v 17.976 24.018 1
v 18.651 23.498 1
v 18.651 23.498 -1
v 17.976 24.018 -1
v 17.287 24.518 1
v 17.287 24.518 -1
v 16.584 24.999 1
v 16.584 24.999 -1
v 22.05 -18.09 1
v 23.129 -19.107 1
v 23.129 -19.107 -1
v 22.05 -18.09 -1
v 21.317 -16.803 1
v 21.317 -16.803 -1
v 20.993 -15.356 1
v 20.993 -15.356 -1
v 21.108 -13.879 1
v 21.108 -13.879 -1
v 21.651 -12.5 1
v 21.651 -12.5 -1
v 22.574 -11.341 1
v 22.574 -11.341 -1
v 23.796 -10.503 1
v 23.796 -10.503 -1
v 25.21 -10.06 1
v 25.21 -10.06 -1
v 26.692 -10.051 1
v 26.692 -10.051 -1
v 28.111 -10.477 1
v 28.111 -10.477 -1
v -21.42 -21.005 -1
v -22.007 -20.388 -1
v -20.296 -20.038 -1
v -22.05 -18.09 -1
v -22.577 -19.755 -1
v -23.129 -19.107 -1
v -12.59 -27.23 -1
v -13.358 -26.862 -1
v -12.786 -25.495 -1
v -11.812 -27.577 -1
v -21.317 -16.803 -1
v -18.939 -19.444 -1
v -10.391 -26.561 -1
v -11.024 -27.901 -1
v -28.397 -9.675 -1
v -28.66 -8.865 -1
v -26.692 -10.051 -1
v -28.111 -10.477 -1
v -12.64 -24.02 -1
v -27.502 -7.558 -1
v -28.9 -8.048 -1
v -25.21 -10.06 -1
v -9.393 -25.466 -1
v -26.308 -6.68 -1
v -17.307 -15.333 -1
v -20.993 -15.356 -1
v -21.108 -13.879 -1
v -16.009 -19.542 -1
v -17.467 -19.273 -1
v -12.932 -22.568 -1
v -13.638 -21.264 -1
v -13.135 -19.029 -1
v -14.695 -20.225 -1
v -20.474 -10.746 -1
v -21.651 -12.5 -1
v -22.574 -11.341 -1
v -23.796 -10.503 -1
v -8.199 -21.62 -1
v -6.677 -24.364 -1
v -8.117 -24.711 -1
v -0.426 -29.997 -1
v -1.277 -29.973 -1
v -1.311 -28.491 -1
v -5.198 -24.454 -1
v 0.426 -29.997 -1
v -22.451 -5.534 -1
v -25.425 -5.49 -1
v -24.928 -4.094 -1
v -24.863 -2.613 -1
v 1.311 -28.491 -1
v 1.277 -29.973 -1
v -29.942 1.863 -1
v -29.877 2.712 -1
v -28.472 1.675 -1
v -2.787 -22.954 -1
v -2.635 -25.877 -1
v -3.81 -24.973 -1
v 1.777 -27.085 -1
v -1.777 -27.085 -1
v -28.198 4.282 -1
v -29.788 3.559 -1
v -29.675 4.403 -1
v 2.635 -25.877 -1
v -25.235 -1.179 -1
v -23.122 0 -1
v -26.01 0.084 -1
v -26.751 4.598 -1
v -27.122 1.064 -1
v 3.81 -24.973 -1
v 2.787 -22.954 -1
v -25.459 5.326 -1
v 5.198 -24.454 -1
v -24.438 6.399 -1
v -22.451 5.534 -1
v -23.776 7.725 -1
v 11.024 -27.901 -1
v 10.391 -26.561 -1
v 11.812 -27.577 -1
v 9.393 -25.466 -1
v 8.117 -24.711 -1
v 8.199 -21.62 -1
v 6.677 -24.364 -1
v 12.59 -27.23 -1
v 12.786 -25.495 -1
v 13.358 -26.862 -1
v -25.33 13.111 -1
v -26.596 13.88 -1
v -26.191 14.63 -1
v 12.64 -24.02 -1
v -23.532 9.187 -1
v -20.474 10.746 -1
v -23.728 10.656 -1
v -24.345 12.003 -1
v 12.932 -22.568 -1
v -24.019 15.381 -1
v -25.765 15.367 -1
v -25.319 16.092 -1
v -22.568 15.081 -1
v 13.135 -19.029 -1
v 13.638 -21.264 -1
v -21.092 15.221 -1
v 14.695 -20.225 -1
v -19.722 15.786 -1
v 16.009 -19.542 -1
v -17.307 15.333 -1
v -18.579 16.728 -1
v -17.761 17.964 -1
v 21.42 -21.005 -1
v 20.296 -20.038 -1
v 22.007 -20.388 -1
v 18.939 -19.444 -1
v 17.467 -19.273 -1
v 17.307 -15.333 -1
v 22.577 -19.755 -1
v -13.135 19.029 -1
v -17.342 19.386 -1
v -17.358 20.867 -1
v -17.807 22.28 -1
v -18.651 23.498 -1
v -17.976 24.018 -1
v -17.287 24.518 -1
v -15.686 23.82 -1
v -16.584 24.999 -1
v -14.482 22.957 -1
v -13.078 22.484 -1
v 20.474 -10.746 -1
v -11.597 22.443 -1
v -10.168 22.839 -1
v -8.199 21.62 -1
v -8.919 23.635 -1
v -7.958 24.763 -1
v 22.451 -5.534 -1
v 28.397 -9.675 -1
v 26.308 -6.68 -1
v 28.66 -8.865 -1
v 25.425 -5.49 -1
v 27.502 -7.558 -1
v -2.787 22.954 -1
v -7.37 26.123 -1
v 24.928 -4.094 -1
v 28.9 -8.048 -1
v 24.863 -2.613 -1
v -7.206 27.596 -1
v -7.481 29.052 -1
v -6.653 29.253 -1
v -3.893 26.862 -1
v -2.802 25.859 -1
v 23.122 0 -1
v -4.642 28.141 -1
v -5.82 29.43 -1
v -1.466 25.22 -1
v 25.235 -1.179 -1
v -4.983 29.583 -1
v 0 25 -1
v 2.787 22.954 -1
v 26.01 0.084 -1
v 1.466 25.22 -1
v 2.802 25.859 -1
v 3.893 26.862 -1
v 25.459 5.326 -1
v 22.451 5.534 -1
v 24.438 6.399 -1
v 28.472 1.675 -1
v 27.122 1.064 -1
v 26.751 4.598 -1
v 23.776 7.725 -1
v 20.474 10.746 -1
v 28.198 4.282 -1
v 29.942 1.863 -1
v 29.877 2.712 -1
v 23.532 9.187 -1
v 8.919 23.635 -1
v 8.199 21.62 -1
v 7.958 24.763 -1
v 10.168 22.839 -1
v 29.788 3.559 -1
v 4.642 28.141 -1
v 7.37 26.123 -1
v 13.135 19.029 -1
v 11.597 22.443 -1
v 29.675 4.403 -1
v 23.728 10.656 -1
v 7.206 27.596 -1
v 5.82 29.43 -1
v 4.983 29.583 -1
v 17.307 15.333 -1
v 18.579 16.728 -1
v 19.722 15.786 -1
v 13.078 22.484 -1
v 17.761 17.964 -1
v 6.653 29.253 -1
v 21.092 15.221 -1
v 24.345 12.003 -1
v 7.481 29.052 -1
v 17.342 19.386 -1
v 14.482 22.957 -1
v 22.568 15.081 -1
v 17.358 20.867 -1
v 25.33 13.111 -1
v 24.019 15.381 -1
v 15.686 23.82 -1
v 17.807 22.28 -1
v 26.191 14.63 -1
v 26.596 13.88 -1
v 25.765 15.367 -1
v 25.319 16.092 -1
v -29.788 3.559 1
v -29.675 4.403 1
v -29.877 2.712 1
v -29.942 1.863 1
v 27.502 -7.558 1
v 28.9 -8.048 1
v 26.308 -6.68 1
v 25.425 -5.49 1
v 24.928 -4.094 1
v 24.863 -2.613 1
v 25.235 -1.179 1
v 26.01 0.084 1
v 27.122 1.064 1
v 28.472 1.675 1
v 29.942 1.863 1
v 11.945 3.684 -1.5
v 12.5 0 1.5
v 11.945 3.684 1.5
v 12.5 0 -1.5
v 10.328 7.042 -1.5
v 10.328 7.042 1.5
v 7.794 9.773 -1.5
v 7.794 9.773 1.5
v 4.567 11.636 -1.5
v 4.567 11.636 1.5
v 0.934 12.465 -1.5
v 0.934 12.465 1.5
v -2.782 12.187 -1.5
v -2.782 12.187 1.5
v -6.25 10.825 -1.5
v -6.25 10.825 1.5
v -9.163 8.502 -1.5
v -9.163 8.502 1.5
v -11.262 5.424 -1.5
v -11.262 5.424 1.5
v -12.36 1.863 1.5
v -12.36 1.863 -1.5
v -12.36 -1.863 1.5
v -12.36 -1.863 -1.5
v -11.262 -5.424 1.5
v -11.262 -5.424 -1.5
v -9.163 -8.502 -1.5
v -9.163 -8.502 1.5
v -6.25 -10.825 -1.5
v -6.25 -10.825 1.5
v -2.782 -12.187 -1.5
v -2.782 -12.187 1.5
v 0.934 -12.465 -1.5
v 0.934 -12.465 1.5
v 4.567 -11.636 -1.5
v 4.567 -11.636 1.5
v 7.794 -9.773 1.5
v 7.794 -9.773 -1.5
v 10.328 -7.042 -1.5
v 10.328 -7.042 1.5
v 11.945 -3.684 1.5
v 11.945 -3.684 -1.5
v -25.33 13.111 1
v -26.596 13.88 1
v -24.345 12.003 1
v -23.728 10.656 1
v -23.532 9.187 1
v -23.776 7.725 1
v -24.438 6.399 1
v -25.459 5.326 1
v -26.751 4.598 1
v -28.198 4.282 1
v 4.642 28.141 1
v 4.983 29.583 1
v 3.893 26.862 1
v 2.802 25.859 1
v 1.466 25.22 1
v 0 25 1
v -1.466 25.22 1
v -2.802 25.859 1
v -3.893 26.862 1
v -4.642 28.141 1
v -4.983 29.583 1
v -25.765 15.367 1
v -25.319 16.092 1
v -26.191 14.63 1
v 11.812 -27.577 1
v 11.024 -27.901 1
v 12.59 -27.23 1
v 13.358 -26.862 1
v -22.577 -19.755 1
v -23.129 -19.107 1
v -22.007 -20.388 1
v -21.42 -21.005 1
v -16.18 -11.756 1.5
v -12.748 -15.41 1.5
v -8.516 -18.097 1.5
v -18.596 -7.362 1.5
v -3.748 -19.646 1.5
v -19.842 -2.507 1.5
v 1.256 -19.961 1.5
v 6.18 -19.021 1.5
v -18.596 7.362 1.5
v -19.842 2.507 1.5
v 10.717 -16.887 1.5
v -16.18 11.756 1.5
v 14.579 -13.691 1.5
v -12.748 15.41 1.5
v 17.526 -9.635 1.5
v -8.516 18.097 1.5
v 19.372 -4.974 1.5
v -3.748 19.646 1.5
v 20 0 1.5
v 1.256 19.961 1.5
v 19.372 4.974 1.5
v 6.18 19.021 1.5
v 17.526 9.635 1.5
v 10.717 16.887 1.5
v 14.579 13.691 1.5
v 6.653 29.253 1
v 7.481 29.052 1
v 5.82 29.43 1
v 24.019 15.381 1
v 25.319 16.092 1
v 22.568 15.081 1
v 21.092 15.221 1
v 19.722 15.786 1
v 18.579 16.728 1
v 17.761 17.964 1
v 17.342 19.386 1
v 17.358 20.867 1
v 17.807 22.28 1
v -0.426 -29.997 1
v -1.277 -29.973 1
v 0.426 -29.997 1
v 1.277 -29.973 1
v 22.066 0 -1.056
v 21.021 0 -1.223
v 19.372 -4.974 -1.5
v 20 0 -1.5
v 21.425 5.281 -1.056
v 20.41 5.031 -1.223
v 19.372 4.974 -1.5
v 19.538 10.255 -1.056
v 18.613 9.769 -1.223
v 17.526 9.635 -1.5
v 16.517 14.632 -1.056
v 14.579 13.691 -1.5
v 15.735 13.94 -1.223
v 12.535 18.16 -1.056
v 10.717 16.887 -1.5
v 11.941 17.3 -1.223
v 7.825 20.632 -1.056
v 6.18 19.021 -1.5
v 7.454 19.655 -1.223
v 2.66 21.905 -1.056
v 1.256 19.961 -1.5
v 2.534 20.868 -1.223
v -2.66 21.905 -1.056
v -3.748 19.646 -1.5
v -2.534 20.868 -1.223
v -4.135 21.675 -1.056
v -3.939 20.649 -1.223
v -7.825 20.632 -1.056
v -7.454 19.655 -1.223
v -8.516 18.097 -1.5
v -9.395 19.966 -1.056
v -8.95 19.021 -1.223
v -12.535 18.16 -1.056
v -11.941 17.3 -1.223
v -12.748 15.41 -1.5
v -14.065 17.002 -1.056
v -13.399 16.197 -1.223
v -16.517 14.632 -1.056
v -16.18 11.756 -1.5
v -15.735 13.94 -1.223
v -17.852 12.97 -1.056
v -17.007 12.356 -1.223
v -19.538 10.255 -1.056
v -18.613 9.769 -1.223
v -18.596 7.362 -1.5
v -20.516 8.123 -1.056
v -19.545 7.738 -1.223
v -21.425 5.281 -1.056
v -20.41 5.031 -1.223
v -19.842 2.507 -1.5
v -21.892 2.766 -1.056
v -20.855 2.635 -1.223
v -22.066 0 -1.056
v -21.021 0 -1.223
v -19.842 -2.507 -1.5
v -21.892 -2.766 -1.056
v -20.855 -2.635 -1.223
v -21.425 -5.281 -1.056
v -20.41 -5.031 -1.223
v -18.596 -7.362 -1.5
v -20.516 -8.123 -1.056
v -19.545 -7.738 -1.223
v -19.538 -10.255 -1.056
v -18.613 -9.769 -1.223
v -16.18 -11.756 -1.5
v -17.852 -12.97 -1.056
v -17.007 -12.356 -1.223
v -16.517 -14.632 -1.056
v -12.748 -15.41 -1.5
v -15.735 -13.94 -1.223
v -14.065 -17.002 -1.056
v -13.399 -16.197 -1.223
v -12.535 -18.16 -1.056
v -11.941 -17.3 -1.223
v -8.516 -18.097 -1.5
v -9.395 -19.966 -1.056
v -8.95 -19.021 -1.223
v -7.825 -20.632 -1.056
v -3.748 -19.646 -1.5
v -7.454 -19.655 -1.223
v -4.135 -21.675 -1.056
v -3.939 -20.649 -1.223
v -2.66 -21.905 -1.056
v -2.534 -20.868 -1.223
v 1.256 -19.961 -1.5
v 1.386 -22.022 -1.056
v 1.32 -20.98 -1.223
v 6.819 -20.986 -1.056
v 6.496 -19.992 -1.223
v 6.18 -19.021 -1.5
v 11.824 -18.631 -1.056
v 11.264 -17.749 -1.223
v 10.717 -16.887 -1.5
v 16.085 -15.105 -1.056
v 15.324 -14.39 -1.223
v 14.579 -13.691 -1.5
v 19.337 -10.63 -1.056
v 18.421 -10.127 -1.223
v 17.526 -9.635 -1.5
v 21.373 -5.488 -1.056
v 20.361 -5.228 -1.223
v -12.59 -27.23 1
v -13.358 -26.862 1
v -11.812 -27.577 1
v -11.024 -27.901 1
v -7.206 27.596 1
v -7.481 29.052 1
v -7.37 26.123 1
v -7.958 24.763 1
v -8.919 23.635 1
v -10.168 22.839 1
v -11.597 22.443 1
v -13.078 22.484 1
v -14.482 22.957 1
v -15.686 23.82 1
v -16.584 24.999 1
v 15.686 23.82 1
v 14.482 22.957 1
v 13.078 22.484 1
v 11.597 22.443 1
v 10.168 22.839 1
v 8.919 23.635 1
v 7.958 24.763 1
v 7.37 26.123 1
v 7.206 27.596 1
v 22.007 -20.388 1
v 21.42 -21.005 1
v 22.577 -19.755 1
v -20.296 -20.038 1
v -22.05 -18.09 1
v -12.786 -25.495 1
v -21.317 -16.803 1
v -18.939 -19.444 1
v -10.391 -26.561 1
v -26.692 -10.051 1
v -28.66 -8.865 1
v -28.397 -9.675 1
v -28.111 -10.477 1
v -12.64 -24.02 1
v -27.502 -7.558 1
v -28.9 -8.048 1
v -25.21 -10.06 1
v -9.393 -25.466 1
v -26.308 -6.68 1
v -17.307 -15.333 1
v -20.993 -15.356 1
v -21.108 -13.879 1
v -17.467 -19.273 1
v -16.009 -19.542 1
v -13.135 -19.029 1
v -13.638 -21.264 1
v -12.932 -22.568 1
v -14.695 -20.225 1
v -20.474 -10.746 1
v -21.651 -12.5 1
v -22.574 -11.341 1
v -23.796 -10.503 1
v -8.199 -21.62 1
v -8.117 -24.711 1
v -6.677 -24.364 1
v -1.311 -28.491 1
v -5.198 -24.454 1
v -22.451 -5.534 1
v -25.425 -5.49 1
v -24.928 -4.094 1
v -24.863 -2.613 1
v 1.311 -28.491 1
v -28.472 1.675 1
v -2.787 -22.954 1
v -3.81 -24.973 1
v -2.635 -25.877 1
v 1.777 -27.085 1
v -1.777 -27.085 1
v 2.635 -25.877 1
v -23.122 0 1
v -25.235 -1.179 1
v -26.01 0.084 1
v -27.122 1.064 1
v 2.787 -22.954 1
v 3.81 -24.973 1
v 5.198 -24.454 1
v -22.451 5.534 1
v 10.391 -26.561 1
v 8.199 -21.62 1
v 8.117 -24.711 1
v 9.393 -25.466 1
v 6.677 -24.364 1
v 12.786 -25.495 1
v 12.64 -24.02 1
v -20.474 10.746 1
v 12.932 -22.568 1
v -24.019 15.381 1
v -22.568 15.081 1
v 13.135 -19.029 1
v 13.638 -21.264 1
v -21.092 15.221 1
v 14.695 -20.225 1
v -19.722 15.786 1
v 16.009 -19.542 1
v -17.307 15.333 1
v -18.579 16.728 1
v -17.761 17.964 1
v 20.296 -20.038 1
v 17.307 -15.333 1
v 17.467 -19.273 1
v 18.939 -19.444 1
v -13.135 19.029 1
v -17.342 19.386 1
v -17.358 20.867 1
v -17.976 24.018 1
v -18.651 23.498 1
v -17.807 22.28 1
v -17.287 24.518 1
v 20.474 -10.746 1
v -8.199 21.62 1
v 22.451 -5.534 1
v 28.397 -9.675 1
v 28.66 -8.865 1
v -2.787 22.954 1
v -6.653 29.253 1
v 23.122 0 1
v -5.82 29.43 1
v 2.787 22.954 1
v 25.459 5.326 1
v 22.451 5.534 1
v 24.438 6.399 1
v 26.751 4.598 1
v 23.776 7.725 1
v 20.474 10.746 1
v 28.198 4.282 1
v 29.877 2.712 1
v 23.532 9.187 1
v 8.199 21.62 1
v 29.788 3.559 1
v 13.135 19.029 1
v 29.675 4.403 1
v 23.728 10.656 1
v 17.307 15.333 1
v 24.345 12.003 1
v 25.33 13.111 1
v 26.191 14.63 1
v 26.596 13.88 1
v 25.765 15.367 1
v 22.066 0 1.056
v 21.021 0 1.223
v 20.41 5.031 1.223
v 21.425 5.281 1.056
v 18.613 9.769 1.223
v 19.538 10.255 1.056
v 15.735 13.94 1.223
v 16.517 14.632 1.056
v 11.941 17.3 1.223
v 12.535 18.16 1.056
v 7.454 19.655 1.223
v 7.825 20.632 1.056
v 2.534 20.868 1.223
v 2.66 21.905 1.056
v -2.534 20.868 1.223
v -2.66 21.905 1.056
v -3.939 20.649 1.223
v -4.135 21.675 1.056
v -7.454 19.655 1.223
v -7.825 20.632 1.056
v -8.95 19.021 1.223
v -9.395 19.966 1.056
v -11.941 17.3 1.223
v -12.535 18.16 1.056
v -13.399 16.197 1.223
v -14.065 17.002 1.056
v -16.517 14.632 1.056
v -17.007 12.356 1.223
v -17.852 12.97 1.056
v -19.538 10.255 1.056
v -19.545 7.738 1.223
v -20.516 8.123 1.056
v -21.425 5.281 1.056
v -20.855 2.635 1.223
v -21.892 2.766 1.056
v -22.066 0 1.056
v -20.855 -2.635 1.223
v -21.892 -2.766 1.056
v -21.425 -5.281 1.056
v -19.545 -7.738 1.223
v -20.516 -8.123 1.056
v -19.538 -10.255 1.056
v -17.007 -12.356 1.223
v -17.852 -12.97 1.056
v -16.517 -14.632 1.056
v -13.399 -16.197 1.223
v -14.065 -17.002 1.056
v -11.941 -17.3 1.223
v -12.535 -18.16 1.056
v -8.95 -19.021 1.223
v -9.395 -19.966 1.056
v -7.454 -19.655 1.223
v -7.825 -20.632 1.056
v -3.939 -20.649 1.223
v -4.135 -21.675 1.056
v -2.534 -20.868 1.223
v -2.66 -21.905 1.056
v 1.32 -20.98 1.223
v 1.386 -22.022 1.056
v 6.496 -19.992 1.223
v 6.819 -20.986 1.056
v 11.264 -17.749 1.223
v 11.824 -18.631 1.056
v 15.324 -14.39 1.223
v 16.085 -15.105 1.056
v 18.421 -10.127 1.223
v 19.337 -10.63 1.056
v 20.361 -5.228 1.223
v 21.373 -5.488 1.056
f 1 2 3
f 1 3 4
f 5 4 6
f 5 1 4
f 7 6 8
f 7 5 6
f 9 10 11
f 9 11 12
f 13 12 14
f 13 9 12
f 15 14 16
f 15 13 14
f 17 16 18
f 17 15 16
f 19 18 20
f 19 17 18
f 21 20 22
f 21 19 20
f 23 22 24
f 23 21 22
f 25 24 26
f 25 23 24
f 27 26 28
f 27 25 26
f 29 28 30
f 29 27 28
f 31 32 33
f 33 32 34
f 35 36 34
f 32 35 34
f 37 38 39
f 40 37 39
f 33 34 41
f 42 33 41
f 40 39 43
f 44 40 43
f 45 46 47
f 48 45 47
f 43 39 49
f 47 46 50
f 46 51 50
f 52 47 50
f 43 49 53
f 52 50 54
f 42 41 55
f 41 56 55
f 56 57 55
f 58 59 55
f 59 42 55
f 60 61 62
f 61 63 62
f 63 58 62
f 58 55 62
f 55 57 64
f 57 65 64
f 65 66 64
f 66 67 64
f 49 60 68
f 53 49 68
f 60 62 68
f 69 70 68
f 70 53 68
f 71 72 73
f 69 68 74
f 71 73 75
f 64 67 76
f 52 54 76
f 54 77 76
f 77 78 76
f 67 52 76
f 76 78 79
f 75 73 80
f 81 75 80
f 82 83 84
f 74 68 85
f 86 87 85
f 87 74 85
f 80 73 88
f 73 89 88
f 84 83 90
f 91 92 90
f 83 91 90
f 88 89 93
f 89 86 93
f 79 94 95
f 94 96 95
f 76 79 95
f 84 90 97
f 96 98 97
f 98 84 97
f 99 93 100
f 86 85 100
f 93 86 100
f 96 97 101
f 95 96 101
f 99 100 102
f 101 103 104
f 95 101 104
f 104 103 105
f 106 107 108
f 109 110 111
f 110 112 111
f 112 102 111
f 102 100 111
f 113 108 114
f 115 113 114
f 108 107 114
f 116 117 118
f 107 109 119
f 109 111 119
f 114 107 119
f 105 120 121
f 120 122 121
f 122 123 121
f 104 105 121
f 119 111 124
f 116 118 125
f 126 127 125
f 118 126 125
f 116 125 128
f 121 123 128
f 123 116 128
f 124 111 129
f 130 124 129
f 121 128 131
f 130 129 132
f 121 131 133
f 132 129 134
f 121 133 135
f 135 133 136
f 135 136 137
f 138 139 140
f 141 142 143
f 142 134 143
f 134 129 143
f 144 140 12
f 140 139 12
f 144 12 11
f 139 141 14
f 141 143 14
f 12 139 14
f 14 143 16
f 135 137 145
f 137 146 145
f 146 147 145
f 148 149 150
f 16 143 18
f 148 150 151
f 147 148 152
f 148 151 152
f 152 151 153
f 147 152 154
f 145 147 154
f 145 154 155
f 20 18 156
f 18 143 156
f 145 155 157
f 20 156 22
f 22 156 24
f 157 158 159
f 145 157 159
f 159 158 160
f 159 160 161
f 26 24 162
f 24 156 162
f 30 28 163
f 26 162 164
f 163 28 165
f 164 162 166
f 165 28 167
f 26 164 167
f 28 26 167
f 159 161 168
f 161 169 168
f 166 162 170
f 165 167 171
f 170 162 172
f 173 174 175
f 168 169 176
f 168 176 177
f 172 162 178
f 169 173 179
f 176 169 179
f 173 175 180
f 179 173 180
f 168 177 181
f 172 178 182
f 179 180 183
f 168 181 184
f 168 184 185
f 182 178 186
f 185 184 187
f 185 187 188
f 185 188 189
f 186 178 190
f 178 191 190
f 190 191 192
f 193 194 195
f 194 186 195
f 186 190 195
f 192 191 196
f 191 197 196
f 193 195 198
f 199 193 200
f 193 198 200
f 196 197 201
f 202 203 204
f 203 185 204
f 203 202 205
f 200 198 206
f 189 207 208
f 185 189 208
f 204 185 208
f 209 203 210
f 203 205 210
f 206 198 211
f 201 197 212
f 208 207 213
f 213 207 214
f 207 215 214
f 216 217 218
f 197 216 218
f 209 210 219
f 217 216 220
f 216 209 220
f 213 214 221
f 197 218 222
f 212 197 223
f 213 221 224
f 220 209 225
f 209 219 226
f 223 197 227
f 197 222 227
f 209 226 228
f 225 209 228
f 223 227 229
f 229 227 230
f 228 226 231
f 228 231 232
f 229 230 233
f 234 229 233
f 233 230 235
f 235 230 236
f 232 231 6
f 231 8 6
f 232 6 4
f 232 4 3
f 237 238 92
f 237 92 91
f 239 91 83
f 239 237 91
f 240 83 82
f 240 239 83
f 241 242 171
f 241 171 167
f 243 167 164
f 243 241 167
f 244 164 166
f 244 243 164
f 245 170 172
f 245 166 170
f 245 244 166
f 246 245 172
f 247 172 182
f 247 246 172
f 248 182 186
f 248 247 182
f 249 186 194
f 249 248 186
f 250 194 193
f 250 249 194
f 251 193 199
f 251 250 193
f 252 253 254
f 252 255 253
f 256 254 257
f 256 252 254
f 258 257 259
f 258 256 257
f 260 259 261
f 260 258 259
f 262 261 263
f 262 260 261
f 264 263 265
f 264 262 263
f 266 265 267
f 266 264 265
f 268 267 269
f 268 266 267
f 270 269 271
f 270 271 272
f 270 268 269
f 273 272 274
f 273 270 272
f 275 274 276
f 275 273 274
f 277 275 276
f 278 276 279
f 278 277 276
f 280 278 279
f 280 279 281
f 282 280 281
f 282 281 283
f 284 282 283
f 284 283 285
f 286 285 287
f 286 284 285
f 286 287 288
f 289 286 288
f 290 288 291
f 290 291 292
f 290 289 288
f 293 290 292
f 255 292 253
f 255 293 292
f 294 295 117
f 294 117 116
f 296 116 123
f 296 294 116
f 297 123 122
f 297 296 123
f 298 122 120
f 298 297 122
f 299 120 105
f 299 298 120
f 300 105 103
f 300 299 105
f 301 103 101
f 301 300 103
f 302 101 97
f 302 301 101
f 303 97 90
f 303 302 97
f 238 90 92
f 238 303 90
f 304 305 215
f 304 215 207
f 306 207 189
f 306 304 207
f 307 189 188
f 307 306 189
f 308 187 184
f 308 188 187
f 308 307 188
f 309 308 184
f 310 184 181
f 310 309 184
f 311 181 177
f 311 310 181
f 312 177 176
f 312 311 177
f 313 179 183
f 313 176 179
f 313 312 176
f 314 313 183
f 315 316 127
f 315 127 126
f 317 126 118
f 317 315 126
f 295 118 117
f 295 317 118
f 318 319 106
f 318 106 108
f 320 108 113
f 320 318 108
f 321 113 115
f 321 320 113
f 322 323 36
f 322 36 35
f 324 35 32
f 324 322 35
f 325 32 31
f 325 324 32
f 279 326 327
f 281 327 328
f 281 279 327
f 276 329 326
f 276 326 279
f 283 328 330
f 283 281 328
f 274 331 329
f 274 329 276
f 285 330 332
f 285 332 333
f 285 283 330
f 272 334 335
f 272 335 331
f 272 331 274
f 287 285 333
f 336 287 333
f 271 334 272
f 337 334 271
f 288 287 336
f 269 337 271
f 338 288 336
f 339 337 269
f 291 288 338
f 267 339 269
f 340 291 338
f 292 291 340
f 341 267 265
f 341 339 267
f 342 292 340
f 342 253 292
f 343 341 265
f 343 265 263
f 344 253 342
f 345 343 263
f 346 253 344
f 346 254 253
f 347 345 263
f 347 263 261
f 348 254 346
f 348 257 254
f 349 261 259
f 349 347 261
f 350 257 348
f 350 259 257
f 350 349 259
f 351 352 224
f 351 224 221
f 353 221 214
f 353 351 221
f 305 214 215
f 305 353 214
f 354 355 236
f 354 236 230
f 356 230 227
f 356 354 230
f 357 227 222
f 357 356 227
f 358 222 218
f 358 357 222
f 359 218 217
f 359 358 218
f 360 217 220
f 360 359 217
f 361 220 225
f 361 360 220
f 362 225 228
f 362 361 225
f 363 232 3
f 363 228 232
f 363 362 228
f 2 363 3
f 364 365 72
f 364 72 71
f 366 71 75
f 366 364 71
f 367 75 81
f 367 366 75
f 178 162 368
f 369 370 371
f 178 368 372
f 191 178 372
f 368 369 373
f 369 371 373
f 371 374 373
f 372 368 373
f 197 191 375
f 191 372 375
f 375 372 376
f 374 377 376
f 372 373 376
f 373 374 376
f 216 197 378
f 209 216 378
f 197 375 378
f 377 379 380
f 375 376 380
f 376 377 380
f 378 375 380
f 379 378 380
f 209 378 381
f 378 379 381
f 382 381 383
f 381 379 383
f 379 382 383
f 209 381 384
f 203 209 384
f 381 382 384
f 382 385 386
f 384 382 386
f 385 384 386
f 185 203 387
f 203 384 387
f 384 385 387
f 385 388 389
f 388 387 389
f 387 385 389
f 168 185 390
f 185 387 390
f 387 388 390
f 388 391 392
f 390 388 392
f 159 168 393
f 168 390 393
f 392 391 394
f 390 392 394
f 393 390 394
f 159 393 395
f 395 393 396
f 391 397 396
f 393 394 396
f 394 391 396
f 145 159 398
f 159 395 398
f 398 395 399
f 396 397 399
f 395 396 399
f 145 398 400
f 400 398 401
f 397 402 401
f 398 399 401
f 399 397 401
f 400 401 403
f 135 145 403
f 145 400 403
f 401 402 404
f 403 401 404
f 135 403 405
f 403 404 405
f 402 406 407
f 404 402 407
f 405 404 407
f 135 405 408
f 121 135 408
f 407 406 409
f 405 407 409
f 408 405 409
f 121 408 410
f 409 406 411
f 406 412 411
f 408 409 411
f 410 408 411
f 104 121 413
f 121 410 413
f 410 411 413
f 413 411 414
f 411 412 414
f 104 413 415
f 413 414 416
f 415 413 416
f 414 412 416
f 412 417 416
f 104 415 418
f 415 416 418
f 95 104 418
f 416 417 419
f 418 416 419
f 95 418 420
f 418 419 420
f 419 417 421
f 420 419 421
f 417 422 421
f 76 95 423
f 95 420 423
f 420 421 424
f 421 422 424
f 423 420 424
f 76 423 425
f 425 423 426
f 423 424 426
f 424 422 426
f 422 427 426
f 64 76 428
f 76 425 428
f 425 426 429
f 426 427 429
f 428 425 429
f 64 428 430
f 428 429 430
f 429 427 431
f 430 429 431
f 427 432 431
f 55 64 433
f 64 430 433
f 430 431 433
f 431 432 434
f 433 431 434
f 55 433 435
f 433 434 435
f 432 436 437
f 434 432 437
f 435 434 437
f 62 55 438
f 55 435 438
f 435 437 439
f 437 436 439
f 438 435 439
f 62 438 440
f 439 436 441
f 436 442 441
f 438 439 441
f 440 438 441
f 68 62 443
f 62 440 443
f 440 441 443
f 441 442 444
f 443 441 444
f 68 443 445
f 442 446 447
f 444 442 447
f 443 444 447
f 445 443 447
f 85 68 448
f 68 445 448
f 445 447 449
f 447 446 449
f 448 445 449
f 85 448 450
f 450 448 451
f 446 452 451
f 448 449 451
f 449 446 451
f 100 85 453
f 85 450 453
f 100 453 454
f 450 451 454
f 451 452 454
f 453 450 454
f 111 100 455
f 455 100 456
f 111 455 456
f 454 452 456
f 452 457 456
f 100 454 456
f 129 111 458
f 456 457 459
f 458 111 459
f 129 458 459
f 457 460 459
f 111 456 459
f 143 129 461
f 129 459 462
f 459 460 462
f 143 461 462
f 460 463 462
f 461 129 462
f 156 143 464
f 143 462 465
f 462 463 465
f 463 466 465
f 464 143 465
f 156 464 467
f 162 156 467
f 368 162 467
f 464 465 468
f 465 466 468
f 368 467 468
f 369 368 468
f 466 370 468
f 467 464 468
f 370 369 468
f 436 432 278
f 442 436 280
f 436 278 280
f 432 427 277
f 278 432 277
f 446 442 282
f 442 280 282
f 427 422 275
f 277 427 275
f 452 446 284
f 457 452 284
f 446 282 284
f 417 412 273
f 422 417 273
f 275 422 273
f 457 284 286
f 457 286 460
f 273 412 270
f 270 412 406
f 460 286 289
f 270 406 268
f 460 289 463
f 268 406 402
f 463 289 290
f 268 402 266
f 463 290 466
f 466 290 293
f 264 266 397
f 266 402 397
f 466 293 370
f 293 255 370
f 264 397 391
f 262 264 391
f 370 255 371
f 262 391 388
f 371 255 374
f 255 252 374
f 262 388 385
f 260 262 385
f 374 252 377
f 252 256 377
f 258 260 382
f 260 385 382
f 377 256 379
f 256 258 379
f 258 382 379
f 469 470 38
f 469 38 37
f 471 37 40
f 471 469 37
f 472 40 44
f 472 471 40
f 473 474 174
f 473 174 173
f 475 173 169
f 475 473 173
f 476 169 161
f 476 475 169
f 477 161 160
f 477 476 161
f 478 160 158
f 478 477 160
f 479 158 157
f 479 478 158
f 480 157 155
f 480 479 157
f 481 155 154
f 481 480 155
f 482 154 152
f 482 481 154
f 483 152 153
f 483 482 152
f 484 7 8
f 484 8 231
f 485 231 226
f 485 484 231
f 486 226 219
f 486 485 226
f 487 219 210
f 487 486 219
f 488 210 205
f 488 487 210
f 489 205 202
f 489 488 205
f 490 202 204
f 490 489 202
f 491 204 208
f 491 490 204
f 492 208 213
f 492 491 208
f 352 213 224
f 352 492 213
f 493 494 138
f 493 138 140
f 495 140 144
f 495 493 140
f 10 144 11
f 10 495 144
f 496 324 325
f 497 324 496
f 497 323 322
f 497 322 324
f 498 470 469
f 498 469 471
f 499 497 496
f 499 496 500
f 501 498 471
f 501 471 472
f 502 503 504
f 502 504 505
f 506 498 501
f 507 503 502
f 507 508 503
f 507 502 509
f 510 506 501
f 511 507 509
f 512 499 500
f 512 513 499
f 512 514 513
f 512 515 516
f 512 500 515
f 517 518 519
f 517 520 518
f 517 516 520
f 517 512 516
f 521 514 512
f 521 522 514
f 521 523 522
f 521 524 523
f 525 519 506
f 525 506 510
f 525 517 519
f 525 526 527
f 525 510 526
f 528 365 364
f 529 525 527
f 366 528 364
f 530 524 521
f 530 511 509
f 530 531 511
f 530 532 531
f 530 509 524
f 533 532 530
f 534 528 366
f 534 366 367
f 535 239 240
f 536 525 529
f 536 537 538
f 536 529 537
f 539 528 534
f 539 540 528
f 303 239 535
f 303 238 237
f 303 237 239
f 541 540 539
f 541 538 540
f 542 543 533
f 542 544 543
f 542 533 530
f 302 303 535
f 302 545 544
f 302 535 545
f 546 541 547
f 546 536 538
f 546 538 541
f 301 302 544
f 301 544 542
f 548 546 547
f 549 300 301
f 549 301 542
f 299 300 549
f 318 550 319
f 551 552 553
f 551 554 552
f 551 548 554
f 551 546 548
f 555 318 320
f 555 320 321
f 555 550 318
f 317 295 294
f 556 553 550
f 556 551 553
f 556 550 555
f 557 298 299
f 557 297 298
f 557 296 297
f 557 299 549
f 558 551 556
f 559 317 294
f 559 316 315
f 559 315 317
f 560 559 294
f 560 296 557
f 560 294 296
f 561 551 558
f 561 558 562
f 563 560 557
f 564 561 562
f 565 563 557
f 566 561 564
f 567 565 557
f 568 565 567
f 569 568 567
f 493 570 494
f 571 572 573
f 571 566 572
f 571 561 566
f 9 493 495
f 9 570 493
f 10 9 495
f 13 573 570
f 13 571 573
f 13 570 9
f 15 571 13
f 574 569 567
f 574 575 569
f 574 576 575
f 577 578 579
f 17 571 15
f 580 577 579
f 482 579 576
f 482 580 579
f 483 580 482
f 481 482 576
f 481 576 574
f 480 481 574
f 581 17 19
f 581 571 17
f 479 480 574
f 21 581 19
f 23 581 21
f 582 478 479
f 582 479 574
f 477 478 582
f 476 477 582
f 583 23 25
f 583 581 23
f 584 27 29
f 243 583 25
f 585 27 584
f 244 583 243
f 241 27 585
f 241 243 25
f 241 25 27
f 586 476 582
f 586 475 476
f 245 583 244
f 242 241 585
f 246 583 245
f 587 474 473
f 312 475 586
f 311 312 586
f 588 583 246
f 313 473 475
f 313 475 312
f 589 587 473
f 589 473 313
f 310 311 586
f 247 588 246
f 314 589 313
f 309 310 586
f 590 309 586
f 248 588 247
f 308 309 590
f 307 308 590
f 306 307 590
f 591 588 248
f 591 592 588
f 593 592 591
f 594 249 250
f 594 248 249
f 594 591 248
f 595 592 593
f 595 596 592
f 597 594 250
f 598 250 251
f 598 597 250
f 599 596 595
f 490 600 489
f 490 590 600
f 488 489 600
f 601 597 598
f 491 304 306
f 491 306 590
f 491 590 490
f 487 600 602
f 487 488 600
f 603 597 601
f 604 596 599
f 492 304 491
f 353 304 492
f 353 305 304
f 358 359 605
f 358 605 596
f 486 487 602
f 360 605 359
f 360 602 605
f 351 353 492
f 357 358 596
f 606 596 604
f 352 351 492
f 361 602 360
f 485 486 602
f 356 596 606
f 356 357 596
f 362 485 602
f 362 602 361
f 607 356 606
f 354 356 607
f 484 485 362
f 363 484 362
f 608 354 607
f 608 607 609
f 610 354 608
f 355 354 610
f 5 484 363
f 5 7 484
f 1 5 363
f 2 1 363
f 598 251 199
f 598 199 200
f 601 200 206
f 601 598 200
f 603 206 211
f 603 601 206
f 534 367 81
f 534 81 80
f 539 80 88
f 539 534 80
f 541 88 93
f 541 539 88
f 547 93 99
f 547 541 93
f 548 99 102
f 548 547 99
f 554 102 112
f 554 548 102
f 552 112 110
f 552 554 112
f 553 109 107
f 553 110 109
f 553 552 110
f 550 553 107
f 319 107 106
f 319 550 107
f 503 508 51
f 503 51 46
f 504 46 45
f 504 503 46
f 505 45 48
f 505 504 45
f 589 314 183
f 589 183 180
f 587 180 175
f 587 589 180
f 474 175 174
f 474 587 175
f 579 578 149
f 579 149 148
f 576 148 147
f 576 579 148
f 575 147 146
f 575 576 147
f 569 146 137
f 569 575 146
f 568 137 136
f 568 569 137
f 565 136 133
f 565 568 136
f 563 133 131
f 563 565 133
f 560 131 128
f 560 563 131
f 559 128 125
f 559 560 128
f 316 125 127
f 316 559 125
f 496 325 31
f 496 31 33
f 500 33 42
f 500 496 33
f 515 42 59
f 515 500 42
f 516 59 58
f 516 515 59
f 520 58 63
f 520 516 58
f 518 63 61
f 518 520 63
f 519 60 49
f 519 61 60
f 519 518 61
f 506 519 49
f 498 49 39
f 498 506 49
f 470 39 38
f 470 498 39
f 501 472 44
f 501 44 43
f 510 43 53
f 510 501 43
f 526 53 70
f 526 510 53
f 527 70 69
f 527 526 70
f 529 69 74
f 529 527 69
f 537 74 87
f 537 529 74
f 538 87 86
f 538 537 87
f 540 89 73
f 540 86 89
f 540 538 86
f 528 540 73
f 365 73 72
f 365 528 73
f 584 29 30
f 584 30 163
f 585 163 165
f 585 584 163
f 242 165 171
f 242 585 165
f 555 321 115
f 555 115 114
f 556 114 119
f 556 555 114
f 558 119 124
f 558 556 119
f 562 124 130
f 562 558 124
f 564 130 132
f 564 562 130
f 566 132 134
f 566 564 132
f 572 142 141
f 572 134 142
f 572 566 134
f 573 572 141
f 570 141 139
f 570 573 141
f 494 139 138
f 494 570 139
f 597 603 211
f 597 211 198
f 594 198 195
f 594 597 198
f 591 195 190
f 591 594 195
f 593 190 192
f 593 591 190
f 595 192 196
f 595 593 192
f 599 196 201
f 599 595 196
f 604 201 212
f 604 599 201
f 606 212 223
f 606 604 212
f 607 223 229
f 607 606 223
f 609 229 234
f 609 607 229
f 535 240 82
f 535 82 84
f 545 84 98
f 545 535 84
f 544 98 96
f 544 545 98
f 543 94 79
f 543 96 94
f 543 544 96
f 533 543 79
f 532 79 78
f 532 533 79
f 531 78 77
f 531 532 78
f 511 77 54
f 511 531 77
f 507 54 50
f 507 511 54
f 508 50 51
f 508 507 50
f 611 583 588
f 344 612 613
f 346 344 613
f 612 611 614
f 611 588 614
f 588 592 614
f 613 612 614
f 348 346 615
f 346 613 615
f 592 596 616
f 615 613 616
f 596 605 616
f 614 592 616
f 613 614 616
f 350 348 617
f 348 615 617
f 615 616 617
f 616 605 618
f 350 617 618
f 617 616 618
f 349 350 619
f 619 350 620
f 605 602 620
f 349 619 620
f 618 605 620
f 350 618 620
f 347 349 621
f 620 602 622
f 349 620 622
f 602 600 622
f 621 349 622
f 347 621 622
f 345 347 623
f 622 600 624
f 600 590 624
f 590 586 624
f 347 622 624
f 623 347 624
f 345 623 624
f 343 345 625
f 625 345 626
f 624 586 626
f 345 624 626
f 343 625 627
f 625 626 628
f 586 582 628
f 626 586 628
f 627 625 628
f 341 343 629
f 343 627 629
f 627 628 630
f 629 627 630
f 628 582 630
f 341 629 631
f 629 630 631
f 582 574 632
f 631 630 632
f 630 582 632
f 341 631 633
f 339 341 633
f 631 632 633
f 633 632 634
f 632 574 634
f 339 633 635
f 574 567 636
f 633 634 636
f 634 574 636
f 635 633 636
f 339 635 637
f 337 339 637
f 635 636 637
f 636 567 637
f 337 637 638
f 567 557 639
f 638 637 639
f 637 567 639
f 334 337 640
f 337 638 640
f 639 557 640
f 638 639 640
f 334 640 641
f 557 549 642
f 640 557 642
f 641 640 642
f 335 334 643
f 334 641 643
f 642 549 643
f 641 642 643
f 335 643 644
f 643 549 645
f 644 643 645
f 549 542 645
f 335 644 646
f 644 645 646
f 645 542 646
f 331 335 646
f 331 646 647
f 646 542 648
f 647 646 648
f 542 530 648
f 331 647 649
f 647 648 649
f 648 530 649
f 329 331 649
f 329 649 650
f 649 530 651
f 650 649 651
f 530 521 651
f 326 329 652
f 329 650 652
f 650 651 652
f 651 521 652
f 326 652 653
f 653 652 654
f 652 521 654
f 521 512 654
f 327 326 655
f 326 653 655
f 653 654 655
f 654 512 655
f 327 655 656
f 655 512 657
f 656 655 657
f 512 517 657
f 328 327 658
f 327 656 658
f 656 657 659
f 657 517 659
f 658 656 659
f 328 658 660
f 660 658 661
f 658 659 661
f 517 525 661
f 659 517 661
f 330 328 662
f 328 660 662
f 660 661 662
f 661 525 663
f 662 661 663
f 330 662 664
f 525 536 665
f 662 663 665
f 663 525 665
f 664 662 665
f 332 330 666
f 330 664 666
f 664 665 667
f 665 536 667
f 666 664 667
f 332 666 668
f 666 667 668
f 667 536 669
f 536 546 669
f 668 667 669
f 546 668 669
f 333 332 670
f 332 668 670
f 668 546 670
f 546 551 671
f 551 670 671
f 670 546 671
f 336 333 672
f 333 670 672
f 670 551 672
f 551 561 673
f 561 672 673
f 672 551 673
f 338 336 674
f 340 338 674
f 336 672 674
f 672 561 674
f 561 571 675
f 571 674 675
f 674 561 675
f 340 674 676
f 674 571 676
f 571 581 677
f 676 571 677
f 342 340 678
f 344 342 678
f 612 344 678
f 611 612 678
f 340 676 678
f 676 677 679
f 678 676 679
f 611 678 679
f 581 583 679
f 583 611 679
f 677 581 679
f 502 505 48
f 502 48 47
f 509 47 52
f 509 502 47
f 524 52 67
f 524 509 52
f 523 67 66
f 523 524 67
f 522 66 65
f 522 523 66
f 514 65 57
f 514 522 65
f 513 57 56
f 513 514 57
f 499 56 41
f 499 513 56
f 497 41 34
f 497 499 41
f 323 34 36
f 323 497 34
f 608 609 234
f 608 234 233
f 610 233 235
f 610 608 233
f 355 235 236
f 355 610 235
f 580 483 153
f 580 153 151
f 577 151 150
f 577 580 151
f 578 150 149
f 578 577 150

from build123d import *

# Parameters (mm, degrees)
SKETCH1_R            = 12.5
BOSS_EXTRUDE1_DEPTH  = 1.5
SKETCH2_R            = 40
SKETCH2_R_2          = 20
CUT_EXTRUDE1_DEPTH   = 0.5
FILLET1_R            = 10
FILLET1_OF_MIRROR1_R = 10


with BuildPart() as part:
    # Sketch1 → Boss-Extrude1 (new, symmetric)
    with BuildSketch(Plane.XY):
        with BuildLine():
            ThreePointArc((-4.982608643, 29.583333333), (-6.237350725, 29.344428022), (-7.480786198, 29.052329302))
            ThreePointArc((-7.480786198, 29.052329302), (-10.168416077, 22.838636441), (-16.584465184, 24.999110275))
            ThreePointArc((-16.584465184, 24.999110275), (-17.633557569, 24.270509831), (-18.650685145, 23.497913602))
            ThreePointArc((-18.650685145, 23.497913602), (-18.578620637, 16.728265159), (-25.31871703, 16.092313941))
            ThreePointArc((-25.31871703, 16.092313941), (-25.980762114, 15), (-26.595711193, 13.880495168))
            ThreePointArc((-26.595711193, 13.880495168), (-23.776412907, 7.725424859), (-29.675132687, 4.403010332))
            ThreePointArc((-29.675132687, 4.403010332), (-29.835656861, 3.135853898), (-29.942097162, 1.86301302))
            ThreePointArc((-29.942097162, 1.86301302), (-24.863047384, -2.613211582), (-28.900448313, -8.047613763))
            ThreePointArc((-28.900448313, -8.047613763), (-28.531695489, -9.270509831), (-28.111222517, -10.476601005))
            ThreePointArc((-28.111222517, -10.476601005), (-21.650635095, -12.5), (-23.128613874, -19.106732329))
            ThreePointArc((-23.128613874, -19.106732329), (-22.294344764, -20.073918191), (-21.419662115, -21.004715539))
            ThreePointArc((-21.419662115, -21.004715539), (-14.694631307, -20.225424859), (-13.357631979, -26.862123295))
            ThreePointArc((-13.357631979, -26.862123295), (-12.202099292, -27.406363729), (-11.024447543, -27.900923934))
            ThreePointArc((-11.024447543, -27.900923934), (-5.19779227, -24.453690018), (-1.276994164, -29.972809109))
            ThreePointArc((-1.276994164, -29.972809109), (0, -30), (1.276994164, -29.972809109))
            ThreePointArc((1.276994164, -29.972809109), (5.19779227, -24.453690018), (11.024447543, -27.900923934))
            ThreePointArc((11.024447543, -27.900923934), (12.202099292, -27.406363729), (13.357631979, -26.862123295))
            ThreePointArc((13.357631979, -26.862123295), (14.694631307, -20.225424859), (21.419662115, -21.004715539))
            ThreePointArc((21.419662115, -21.004715539), (22.294344764, -20.073918191), (23.128613874, -19.106732329))
            ThreePointArc((23.128613874, -19.106732329), (21.650635095, -12.5), (28.111222517, -10.476601005))
            ThreePointArc((28.111222517, -10.476601005), (28.531695489, -9.270509831), (28.900448313, -8.047613763))
            ThreePointArc((28.900448313, -8.047613763), (24.863047384, -2.613211582), (29.942097162, 1.86301302))
            ThreePointArc((29.942097162, 1.86301302), (29.835656861, 3.135853898), (29.675132687, 4.403010332))
            ThreePointArc((29.675132687, 4.403010332), (23.776412907, 7.725424859), (26.595711193, 13.880495168))
            ThreePointArc((26.595711193, 13.880495168), (25.980762114, 15), (25.31871703, 16.092313941))
            ThreePointArc((25.31871703, 16.092313941), (18.578620637, 16.728265159), (18.650685145, 23.497913602))
            ThreePointArc((18.650685145, 23.497913602), (17.633557569, 24.270509831), (16.584465184, 24.999110275))
            ThreePointArc((16.584465184, 24.999110275), (10.168416077, 22.838636441), (7.480786198, 29.052329302))
            ThreePointArc((7.480786198, 29.052329302), (6.237350725, 29.344428022), (4.982608643, 29.583333333))
            ThreePointArc((4.982608643, 29.583333333), (0, 25), (-4.982608643, 29.583333333))
        make_face()
        Circle(SKETCH1_R, mode=Mode.SUBTRACT)
    extrude(amount=BOSS_EXTRUDE1_DEPTH, both=True)

    # Sketch2 → Cut-Extrude1 (cut)
    with BuildSketch(Plane.XY.offset(1.5)):
        Circle(SKETCH2_R)
        Circle(SKETCH2_R_2, mode=Mode.SUBTRACT)
    cut_extrude1 = extrude(amount=-CUT_EXTRUDE1_DEPTH, mode=Mode.SUBTRACT)

    # Fillet1
    # the kernel refuses this fillet: 10 mm, written as the material it adds along each edge
    with BuildSketch(Plane(origin=(0, 0, 1), x_dir=(1, 0, 0), z_dir=(0, -1, 0))) as fillet1_piece_1:
        with BuildLine():
            CenterArc((23.122498999, 10), FILLET1_R, 251.805127661, 18.194872339)
            Line((20, 0.5), (19.93755002, 0.31))
            ThreePointArc((19.93755002, 0.31), (19.8, 0.25), (19.8, 0))
            Line((19.8, 0), (20, -0.2))
            Line((20, -0.2), (23.122498999, -0.2))
            Line((23.122498999, -0.2), (23.122498999, 0))
        make_face()
    revolve(axis=Axis((0, 0, 1), (0, 0, 1)))

    # Mirror1: Cut-Extrude1 across plane
    add(cut_extrude1.mirror(Plane.XY), mode=Mode.SUBTRACT)

    # Fillet1 of Mirror1
    # the kernel refuses this fillet: 10 mm, written as the material it adds along each edge
    with BuildSketch(Plane(origin=(0, 0, -1), x_dir=(1, 0, 0), z_dir=(0, -1, 0))) as fillet1_of_mirror1_piece_1:
        with BuildLine():
            CenterArc((23.122498999, -10), FILLET1_OF_MIRROR1_R, 90, 18.194872339)
            Line((20, -0.5), (19.93755002, -0.31))
            ThreePointArc((19.93755002, -0.31), (19.8, -0.25), (19.8, 0))
            Line((19.8, 0), (20, 0.2))
            Line((20, 0.2), (23.122498999, 0.2))
            Line((23.122498999, 0.2), (23.122498999, 0))
        make_face()
    revolve(axis=Axis((0, 0, -1), (0, 0, 1)))


solid = part.part
